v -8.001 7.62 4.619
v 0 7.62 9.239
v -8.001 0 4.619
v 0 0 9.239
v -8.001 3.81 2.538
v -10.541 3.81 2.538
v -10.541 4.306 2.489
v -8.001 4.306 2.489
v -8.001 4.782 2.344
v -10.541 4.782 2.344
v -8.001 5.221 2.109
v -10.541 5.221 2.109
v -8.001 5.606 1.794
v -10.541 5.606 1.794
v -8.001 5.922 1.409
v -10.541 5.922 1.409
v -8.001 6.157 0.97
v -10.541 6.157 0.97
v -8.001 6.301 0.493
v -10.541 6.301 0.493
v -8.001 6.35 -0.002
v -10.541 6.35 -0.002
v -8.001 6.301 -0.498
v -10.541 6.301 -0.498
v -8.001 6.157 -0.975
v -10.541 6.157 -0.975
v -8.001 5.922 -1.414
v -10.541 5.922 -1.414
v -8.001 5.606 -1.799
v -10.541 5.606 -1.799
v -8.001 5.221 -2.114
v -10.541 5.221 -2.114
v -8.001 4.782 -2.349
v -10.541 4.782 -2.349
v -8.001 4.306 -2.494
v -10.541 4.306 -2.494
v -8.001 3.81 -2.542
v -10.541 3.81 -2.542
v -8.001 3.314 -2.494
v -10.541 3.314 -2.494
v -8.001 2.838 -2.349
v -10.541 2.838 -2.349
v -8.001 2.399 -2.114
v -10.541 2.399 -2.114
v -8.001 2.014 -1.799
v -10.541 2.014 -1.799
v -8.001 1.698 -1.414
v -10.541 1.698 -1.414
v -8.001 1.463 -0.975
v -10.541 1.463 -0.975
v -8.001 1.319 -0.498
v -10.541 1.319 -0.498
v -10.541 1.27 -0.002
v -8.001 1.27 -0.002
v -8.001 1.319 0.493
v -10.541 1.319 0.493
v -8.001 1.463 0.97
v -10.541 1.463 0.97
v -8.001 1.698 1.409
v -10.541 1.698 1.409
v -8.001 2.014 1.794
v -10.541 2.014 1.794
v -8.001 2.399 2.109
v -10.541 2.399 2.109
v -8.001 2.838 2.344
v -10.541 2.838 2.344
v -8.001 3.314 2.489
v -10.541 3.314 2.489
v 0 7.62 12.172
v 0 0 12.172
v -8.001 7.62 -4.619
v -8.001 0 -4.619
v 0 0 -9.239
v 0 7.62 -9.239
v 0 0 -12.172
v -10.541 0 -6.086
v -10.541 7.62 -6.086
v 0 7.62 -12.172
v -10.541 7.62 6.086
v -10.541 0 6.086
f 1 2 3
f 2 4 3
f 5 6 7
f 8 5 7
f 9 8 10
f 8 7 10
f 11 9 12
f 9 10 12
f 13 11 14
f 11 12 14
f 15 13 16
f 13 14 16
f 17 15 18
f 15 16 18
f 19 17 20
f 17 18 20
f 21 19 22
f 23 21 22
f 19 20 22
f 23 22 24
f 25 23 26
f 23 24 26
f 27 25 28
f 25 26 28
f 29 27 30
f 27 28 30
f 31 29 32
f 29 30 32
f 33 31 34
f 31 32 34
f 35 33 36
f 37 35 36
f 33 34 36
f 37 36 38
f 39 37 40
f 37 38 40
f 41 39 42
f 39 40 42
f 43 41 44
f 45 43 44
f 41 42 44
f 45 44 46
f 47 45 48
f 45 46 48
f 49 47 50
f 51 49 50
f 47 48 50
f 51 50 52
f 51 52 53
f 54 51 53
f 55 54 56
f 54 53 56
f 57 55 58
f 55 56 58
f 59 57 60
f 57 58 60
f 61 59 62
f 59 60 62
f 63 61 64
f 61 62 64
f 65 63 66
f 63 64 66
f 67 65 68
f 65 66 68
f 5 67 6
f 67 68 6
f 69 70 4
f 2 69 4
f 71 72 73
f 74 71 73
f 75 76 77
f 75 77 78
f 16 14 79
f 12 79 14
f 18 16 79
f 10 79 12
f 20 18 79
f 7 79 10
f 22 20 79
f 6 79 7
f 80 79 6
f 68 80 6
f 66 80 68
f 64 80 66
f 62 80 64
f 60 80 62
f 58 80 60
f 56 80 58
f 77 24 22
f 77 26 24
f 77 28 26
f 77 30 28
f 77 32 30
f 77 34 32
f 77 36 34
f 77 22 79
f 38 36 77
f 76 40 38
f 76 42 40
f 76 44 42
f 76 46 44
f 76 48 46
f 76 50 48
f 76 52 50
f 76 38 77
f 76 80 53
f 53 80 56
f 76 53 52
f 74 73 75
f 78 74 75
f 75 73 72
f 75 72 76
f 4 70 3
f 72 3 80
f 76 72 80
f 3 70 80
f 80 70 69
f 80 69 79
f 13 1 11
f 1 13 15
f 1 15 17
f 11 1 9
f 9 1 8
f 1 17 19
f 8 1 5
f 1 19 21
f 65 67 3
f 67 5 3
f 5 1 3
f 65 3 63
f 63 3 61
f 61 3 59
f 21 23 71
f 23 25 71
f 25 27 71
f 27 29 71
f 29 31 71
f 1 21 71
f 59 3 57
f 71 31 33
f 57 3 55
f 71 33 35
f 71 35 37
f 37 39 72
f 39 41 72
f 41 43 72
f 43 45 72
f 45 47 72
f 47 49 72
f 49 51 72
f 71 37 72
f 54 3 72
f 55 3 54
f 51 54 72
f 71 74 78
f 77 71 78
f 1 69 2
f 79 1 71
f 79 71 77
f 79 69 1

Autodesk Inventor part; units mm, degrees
ref_plane "YZ Plane" through (0, 0, 0) normal (1, 0, 0) x (0, 1, 0)
ref_plane "XZ Plane" through (0, 0, 0) normal (0, 1, 0) x (-1, 0, 0)
ref_plane "XY Plane" through (0, 0, 0) normal (0, 0, 1) x (1, 0, 0)
sketch "Sketch1" plane through (0, 0, 0) normal (0, 1, 0) x (-1, 0, 0)
  line L0 (0, 9.2388) -> (8.001, 4.6194)
  line L1 (8.001, 4.6194) -> (8.001, -4.6194)
  line L2 (8.001, -4.6194) -> (0, -9.2388)
  line L3 (10.541, -6.0858) -> (0, -12.1717)
  line L4 (0, 12.1717) -> (10.541, 6.0858)
  line L5 (10.541, 6.0858) -> (10.541, -6.0858)
  line L6 (0, 12.1717) -> (0, 9.2388)
  line L7 (0, -9.2388) -> (0, -12.1717)
  point P0 (0, 0)
  point P1 (0, 0)
  point P2 (0, 0)
  point P3 (0, 0)
  dimension "d5" = 2.54
extrude "Extrusion1" add sketch "Sketch1" along normal blind 7.62
sketch "Sketch2" plane through (-10.541, 0, -6.0858) normal (-1, 0, 0) x (0, 0, 1)
  circle A0 centre (6.0833, 3.81) radius 2.54
  line L0 (0, 0) -> (12.1717, 0) projected
  line L1 (12.1717, 0) -> (12.1717, 7.62) projected
  line L2 (0, 0) -> (0, 7.62) projected
  point P0 (6.0858, 0)
  dimension "d8" = 5.08
  dimension "d9" = 3.81
  dimension "d10" = 12.1717
  dimension "d11" = 6.0833
extrude "Extrusion2" cut sketch "Sketch2" against normal through all
properties part number "GearboxDogHolder"
